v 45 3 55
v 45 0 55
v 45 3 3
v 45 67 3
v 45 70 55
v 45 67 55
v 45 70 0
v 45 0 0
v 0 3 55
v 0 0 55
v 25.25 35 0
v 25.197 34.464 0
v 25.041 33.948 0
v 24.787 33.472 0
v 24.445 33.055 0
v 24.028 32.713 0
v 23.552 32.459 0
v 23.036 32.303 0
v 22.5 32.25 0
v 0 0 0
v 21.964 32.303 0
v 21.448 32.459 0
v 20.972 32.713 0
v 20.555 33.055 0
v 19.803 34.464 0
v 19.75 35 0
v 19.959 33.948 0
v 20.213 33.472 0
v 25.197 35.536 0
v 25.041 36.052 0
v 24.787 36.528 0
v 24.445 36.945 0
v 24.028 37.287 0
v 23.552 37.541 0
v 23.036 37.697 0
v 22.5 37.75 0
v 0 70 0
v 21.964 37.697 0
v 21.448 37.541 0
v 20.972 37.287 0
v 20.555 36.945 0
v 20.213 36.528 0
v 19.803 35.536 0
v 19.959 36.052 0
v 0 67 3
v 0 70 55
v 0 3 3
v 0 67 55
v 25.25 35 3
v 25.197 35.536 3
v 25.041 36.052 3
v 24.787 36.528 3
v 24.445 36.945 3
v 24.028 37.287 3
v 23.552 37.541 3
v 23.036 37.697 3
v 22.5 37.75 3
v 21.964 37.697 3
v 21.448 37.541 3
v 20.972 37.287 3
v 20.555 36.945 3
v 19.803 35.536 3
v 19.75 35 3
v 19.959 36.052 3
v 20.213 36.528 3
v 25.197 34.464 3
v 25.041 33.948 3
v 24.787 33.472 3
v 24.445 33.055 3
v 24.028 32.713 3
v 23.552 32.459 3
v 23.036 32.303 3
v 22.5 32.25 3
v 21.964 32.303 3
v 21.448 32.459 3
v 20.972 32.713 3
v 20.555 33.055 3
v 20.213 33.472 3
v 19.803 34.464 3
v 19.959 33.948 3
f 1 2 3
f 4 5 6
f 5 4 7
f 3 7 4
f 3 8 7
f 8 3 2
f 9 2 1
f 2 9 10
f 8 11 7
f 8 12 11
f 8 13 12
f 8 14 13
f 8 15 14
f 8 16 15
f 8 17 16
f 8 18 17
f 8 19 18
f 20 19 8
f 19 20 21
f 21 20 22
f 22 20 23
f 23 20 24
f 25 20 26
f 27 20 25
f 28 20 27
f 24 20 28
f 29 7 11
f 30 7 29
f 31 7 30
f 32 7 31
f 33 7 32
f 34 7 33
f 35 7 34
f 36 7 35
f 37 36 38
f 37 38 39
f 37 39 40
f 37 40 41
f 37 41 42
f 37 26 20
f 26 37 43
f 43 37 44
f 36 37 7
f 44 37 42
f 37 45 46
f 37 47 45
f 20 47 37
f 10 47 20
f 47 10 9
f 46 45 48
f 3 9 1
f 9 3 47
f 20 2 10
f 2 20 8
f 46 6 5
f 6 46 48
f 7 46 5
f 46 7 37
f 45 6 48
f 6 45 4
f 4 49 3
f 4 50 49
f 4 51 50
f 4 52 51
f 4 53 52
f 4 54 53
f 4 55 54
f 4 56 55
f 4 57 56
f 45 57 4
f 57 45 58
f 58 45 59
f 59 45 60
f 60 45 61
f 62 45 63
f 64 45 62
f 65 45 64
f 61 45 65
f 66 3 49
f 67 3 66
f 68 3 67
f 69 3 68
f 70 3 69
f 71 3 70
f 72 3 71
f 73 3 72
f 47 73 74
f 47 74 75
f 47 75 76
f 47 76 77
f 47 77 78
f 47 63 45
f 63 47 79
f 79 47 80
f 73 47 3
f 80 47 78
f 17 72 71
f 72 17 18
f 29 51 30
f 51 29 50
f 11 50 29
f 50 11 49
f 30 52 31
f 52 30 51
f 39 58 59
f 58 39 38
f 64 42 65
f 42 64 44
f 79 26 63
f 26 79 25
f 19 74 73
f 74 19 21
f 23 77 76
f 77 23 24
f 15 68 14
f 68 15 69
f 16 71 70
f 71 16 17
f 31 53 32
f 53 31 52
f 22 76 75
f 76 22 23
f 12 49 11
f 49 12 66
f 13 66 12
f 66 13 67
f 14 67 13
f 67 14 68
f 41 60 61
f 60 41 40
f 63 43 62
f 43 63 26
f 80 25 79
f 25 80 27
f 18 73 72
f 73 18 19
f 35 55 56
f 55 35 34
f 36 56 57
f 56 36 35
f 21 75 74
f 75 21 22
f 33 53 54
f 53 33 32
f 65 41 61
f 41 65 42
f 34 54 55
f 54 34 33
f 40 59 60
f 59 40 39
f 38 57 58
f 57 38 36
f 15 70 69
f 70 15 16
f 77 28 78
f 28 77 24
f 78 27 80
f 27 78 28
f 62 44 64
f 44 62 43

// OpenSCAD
$fn = 32;

// ----------------------------------------------------------------------
// U-bracket: 45 x 70 x 55 mm
// ----------------------------------------------------------------------

// --- parameters (mm) ---
rail_len = 45;            // outer length, X
jaw_w = 70;               // outer width, Y
jaw_h = 55;               // upright height, Z
web_t = 3;                // wall thickness
hole_d = 5.5;             // clearance for M5

module hole_z(px, py) {
  translate([px, py, -0.5]) cylinder(h = web_t + 1, d = hole_d);
}
module hole_y_pz(pz) {
  /* through both uprights along Y */
  translate([0, -0.5, pz]) rotate([-90, 0, 0]) cylinder(h = jaw_w + 1, d = hole_d);
}

module base() {
  cube([rail_len, jaw_w, web_t]);
}

module uprights() {
  cube([rail_len, web_t, jaw_h]);
  translate([0, jaw_w - web_t, 0]) cube([rail_len, web_t, jaw_h]);
}

difference() {
  union() {
    base();
    uprights();
  }
  hole_z(22.5, 35);
}
